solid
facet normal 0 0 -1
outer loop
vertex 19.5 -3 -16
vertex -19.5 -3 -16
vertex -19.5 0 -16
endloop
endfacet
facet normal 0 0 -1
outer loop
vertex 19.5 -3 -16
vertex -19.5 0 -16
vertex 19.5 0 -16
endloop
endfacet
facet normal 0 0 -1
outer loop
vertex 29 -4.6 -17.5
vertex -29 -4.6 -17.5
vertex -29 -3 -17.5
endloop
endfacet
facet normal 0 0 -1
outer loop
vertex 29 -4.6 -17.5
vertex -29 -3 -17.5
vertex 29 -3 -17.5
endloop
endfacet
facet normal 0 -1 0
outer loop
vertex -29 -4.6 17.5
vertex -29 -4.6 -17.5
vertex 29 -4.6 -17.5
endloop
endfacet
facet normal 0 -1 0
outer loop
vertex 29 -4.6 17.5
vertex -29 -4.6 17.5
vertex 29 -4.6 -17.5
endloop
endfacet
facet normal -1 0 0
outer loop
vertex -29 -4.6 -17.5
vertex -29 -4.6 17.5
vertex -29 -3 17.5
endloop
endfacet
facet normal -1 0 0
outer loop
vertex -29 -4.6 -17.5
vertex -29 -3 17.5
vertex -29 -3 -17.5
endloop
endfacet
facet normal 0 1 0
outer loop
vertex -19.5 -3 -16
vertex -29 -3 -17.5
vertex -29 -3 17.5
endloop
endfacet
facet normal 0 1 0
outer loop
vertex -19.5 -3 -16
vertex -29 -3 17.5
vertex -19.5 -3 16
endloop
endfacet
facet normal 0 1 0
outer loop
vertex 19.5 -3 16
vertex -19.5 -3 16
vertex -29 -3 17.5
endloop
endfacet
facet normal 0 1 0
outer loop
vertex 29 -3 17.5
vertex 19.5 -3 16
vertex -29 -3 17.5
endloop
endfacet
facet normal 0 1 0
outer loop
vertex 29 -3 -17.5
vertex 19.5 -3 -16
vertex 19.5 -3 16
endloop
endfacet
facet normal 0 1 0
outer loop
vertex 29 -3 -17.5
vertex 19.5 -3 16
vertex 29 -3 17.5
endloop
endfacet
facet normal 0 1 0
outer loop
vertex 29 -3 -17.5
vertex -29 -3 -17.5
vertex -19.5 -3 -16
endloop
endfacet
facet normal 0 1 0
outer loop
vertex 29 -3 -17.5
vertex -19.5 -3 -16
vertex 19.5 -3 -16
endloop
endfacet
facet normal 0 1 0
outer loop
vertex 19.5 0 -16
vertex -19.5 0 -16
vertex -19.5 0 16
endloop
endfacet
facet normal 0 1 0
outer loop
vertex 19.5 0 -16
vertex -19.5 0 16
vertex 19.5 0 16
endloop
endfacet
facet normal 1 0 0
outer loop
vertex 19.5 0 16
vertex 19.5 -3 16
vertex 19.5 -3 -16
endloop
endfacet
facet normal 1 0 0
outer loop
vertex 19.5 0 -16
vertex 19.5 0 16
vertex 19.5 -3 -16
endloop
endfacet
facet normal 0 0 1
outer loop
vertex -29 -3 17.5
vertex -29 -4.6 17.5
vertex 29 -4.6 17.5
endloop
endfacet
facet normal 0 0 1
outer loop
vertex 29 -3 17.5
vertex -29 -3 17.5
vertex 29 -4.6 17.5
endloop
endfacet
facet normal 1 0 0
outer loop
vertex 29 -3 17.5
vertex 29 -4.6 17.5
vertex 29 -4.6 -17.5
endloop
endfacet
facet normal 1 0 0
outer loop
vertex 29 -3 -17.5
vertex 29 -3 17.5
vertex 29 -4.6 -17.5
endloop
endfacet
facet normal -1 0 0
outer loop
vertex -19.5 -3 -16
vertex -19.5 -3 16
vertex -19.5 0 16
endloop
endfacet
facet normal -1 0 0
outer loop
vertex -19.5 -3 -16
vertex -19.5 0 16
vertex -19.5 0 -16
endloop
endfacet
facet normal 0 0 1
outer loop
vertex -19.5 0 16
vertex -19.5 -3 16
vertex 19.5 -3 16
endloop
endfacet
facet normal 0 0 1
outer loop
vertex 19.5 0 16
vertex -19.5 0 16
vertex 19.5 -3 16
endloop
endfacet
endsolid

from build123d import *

# Parameters (mm, degrees)
LCD_GLASS_START = -3
SKETCH1_W       = 39
SKETCH1_H       = 32
LCD_GLASS_DEPTH = 3
BOARD_START     = -4.6
SKETCH2_W       = 58
SKETCH2_H       = 35
BOARD_DEPTH     = 1.6


with BuildPart() as part:
    # Sketch1 → LCD_Glass (new body)
    with BuildSketch(Plane(origin=(0, 0, 0), x_dir=(1, 0, 0), z_dir=(0, 1, 0)).offset(LCD_GLASS_START)):
        Rectangle(SKETCH1_W, SKETCH1_H)
    extrude(amount=LCD_GLASS_DEPTH)

    # Sketch2 → Board (add)
    with BuildSketch(Plane(origin=(0, 0, 0), x_dir=(1, 0, 0), z_dir=(0, 1, 0)).offset(BOARD_START)):
        Rectangle(SKETCH2_W, SKETCH2_H)
    extrude(amount=BOARD_DEPTH)


solid = part.part
